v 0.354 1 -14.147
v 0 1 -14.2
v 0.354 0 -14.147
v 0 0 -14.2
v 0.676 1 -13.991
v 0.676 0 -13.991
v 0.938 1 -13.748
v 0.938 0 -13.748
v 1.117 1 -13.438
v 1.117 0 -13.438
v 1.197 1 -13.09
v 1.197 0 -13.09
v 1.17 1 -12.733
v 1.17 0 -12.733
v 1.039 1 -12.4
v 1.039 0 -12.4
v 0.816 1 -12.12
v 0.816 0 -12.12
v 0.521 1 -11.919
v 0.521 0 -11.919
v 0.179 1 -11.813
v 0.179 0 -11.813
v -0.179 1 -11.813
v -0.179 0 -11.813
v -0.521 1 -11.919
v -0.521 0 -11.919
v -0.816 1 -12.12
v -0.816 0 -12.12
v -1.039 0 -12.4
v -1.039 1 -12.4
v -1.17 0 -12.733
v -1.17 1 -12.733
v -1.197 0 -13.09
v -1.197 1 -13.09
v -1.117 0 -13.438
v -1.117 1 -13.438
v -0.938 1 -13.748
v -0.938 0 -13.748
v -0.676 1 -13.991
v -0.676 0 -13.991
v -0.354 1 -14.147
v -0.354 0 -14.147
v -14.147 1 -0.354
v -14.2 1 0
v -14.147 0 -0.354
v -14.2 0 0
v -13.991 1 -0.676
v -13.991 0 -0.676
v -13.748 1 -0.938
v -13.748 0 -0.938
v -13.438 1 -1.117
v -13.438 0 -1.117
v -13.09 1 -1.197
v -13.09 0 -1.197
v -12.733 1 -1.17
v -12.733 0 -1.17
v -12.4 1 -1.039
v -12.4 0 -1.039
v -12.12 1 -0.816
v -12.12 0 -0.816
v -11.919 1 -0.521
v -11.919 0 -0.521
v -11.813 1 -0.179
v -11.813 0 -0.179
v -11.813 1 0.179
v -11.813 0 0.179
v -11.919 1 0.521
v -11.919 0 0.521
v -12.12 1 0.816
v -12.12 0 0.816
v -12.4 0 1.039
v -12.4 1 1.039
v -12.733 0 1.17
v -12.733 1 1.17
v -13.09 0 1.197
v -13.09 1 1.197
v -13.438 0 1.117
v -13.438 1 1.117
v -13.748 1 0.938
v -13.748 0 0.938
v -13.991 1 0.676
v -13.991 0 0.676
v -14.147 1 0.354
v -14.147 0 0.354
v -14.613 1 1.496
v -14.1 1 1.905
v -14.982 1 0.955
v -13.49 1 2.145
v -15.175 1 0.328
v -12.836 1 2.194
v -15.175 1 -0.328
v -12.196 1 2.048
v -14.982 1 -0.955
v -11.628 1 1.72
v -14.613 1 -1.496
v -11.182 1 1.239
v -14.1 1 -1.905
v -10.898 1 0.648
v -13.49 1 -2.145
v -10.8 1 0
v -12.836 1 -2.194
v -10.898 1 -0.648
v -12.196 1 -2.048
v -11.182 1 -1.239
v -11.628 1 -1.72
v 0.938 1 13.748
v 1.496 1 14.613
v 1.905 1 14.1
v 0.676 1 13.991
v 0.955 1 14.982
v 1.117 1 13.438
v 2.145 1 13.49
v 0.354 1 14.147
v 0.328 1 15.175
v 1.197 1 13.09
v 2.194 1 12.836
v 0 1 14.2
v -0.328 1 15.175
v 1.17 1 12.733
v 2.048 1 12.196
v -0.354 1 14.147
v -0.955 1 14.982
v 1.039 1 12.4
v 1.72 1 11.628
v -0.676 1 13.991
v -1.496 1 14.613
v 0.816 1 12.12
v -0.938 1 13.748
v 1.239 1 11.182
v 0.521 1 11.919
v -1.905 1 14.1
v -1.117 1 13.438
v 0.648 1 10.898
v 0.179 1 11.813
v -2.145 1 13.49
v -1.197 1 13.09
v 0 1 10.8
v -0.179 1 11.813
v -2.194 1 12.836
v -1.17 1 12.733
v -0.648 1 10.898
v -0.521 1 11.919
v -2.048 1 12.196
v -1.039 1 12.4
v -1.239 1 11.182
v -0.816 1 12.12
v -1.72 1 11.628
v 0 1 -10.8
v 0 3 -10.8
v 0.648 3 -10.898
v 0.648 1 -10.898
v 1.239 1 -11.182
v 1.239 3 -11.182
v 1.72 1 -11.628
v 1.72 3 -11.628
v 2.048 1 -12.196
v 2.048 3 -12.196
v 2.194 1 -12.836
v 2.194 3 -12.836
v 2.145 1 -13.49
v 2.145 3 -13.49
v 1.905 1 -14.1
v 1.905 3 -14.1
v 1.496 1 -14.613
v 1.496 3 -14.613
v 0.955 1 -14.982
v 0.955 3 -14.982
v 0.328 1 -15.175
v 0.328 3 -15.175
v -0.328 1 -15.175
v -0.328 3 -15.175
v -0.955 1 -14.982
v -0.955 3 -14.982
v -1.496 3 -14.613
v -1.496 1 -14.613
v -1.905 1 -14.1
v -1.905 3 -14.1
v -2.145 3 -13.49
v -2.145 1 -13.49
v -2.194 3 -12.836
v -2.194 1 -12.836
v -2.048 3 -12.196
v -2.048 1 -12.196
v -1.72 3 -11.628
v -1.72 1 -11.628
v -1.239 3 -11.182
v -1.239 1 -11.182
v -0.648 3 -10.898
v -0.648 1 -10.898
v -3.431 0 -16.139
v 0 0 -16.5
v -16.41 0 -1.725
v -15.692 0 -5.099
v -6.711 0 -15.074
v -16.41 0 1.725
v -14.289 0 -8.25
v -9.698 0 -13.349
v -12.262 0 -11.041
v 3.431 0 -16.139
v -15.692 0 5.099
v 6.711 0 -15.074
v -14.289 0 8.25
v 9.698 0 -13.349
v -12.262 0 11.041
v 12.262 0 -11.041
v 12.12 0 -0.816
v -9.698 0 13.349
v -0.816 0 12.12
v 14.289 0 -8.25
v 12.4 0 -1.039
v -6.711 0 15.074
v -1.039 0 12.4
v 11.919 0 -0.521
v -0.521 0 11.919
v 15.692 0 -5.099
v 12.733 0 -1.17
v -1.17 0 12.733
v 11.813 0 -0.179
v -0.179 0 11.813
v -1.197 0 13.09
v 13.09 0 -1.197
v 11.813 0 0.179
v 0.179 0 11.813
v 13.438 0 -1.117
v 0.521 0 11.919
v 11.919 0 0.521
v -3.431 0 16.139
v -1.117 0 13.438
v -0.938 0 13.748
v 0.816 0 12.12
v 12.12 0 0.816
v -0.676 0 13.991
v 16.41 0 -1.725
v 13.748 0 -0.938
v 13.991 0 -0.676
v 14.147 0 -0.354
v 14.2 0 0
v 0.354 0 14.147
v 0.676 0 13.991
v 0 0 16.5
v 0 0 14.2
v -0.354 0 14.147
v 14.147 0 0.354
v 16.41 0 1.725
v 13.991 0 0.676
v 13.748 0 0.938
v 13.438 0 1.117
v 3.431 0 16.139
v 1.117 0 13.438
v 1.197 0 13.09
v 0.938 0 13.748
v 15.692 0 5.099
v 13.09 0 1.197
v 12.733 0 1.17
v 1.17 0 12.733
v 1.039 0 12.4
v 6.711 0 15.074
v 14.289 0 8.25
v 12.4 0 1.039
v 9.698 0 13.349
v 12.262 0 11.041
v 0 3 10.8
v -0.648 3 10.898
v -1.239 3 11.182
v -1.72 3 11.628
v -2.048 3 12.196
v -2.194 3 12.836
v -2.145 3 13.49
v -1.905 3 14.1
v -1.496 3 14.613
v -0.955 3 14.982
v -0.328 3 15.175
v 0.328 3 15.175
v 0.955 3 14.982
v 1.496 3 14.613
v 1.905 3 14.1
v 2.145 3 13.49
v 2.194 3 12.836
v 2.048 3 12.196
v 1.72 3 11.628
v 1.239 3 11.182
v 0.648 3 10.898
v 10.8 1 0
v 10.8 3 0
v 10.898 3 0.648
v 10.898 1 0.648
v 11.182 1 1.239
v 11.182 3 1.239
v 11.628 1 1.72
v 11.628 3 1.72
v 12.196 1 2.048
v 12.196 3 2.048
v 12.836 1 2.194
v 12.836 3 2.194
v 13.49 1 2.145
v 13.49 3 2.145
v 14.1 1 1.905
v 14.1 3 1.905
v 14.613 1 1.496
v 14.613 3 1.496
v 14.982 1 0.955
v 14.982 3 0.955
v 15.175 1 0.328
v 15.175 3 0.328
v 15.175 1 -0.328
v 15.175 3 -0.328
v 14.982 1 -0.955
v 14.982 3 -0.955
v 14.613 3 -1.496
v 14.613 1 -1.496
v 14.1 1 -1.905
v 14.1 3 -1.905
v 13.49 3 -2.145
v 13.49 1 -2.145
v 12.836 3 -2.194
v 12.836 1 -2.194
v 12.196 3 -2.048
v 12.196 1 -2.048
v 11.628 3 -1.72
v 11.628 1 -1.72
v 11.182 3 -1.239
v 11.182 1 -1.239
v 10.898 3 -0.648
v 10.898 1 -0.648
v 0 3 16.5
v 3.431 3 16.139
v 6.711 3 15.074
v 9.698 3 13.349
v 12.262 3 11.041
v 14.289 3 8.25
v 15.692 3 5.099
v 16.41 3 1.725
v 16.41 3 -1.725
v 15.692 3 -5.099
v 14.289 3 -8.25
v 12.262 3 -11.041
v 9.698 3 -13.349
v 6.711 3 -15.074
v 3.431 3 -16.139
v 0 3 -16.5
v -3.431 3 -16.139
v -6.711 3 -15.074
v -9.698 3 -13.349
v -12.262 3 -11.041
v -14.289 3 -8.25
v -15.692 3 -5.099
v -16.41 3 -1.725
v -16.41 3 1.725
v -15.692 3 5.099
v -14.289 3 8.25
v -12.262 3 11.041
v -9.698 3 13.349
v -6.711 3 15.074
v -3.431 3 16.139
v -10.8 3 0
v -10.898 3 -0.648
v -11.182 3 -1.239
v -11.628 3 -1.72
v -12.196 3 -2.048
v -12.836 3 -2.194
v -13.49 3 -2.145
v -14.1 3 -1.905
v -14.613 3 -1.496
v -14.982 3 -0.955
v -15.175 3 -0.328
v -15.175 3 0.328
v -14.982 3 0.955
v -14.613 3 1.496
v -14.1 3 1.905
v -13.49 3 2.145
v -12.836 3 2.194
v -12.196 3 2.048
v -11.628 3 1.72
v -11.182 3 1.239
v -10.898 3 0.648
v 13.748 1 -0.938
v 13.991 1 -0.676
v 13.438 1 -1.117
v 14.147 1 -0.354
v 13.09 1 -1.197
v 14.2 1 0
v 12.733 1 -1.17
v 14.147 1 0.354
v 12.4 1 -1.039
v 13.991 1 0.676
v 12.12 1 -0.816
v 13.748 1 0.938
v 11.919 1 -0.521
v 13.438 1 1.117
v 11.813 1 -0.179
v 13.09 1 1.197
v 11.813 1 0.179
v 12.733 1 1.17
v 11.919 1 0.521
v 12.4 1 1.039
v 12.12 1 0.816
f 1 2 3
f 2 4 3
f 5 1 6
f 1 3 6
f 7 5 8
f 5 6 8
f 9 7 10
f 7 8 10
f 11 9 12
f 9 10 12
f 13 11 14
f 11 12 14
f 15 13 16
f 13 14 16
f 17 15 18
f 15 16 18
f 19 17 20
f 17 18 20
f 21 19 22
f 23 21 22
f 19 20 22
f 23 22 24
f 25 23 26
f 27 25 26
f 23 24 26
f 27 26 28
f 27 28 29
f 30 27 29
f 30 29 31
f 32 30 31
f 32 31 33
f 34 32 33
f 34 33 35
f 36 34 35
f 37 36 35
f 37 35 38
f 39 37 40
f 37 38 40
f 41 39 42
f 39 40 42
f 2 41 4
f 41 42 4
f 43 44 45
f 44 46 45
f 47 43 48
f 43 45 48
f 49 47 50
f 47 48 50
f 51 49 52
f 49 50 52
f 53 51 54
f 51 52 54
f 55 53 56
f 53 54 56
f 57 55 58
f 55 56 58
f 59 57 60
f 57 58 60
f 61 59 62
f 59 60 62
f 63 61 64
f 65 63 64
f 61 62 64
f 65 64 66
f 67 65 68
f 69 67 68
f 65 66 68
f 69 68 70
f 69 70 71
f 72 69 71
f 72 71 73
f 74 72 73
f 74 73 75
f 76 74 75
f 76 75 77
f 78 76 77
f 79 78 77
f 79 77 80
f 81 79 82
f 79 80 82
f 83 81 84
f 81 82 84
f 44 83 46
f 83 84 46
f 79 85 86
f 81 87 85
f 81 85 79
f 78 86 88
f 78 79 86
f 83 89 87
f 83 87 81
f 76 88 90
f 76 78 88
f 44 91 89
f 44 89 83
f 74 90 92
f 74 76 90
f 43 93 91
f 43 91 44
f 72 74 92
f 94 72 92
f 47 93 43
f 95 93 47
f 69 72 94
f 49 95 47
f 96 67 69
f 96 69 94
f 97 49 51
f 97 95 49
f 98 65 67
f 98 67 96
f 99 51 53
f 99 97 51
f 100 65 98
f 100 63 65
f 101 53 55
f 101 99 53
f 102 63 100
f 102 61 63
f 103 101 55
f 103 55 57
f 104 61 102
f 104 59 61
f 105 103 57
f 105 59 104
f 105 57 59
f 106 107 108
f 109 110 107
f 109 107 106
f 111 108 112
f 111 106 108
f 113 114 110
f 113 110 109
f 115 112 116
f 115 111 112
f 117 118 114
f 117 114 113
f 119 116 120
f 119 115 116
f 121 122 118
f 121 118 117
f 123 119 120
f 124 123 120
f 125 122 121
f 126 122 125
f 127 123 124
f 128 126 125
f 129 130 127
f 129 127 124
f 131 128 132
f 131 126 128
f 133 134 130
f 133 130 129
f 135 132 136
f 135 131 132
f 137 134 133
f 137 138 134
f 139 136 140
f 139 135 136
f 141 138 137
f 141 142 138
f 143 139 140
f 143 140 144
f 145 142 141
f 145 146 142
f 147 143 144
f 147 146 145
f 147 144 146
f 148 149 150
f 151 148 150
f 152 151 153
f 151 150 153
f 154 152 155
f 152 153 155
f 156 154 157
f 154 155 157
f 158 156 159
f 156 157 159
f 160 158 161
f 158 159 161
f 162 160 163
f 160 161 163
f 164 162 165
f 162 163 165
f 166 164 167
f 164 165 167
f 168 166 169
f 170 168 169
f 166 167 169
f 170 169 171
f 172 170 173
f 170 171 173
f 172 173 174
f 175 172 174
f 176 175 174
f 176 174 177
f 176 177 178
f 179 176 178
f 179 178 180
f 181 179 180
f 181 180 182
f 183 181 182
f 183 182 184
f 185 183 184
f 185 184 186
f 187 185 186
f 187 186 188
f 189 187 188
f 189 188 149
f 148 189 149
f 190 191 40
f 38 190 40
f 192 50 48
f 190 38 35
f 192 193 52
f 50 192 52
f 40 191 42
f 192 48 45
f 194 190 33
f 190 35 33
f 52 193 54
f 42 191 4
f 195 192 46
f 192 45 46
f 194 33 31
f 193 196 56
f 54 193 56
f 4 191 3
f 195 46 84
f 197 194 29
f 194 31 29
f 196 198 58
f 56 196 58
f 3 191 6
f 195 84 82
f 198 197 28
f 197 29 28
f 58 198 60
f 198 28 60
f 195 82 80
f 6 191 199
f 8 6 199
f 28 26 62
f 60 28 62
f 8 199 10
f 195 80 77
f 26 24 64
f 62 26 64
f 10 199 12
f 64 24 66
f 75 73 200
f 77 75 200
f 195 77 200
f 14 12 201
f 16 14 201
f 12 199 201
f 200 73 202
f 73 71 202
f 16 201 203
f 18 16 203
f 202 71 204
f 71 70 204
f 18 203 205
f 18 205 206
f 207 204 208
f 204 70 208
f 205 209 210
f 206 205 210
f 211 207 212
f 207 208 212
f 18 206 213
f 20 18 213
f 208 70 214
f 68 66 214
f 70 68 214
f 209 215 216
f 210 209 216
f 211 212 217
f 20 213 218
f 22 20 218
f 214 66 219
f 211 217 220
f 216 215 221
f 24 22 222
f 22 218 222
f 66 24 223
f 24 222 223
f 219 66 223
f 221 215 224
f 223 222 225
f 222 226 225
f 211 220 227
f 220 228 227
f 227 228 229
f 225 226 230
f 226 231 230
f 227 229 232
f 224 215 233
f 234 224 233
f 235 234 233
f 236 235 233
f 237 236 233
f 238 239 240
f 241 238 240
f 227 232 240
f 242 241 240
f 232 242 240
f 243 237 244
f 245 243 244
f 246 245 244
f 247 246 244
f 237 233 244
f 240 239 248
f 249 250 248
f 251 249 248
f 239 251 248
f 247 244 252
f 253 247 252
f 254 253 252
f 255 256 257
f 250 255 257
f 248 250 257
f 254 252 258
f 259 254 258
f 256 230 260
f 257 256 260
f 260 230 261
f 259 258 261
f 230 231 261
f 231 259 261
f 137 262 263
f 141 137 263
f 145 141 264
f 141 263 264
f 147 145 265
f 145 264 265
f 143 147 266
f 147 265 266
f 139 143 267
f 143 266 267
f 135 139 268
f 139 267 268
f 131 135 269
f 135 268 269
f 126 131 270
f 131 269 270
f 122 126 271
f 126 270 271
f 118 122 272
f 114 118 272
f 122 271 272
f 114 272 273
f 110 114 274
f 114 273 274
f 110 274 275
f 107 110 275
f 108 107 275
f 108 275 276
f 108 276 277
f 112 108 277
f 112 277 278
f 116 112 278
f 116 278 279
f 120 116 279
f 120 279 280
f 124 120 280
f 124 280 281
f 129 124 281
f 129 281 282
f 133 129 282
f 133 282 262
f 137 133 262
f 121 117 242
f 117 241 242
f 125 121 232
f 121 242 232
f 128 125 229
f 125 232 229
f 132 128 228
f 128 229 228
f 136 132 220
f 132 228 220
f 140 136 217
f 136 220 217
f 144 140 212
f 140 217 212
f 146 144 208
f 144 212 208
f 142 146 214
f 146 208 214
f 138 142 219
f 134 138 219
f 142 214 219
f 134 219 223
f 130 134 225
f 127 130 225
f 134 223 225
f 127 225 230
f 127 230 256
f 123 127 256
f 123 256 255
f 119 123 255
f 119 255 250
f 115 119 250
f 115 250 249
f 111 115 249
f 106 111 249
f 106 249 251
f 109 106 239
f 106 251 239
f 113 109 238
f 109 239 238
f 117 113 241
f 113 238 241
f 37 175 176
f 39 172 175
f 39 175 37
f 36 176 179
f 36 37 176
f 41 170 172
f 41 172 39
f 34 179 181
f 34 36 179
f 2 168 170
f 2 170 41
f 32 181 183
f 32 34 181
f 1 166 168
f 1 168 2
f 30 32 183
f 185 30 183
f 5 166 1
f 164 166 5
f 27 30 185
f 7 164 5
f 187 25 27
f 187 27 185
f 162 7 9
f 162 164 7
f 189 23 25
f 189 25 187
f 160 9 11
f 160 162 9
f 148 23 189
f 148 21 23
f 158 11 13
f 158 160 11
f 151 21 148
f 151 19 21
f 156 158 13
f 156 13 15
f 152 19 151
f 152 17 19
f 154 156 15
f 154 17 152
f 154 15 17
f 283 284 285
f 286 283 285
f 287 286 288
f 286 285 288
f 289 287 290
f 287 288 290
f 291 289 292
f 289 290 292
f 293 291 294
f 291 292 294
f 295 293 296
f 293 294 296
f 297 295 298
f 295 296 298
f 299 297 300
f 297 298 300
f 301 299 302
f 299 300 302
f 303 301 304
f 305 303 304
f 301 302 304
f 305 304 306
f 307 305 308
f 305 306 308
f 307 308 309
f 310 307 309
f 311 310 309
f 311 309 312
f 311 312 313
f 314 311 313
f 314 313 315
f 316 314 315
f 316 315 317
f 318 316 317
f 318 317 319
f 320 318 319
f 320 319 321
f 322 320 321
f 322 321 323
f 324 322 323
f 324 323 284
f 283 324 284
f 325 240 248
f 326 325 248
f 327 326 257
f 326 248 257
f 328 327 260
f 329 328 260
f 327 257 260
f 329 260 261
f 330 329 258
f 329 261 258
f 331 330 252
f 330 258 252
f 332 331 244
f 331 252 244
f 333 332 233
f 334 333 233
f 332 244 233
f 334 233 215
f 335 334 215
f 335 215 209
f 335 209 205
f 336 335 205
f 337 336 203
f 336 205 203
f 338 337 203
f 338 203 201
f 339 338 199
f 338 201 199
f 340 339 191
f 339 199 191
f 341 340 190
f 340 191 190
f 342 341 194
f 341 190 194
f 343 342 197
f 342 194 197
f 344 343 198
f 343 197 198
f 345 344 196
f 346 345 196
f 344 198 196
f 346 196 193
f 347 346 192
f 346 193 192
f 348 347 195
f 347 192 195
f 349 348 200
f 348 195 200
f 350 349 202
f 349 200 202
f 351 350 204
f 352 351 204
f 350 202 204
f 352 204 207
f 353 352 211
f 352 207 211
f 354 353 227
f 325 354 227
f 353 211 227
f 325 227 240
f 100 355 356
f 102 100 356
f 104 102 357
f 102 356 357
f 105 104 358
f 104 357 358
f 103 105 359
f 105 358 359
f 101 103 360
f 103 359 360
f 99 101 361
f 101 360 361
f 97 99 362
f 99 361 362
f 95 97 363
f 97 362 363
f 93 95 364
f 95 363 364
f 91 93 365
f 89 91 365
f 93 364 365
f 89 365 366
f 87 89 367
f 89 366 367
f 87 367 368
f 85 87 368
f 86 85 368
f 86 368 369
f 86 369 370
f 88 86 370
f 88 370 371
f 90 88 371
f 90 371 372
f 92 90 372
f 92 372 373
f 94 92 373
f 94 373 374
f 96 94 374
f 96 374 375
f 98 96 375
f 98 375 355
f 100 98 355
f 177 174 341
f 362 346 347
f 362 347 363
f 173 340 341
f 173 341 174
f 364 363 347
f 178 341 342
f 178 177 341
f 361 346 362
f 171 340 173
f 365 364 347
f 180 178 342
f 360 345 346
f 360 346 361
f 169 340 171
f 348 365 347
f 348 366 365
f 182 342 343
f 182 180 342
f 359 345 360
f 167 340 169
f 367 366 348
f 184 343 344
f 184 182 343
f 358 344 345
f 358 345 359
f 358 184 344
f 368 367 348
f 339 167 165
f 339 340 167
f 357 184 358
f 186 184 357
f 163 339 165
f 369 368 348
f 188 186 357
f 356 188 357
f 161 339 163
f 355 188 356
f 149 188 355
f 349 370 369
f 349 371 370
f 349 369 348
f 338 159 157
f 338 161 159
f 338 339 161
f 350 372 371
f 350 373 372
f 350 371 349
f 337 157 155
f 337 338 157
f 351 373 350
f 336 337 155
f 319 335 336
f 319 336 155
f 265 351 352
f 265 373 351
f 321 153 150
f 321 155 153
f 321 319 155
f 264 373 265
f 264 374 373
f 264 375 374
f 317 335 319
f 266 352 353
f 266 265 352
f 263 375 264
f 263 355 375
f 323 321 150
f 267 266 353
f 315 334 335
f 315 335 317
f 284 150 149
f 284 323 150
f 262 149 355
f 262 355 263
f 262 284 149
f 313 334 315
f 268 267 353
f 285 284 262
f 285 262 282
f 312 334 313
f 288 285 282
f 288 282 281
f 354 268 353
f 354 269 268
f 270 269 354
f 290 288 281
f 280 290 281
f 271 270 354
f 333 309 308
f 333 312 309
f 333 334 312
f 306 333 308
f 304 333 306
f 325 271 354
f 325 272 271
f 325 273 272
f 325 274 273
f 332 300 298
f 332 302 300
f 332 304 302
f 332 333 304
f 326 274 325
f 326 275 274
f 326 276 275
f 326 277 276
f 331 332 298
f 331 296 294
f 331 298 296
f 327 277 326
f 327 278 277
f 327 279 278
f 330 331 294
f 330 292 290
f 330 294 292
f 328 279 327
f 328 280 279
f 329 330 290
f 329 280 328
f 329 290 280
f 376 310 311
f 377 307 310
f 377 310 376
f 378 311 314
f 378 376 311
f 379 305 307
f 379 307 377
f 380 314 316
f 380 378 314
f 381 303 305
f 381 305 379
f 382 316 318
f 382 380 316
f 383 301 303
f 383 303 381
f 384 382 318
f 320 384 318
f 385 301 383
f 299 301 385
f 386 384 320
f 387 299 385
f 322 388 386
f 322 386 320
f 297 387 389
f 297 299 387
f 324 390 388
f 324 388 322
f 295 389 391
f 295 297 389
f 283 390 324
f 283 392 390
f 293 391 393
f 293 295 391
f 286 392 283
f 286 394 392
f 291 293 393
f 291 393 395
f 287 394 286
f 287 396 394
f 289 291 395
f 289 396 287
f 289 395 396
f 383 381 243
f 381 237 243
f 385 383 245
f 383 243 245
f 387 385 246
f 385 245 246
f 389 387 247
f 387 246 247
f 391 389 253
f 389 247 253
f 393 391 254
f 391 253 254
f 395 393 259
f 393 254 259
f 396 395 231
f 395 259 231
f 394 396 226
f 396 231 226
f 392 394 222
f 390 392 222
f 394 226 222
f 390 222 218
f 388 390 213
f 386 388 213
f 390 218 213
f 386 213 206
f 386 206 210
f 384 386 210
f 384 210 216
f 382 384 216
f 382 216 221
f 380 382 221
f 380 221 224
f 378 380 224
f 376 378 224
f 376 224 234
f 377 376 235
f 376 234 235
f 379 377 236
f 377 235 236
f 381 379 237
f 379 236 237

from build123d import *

# Parameters (mm, degrees)
SKETCH1_R                      = 16.5
BOSS_EXTRUDE1_DEPTH            = 3
CBORE_FOR_M2_SHCS1_D           = 2.4
CBORE_FOR_M2_SHCS1_CBORE_D     = 4.4
CBORE_FOR_M2_SHCS1_CBORE_DEPTH = 2
CIRPATTERN1_COUNT              = 4


with BuildPart() as part:
    # Sketch1 → Boss-Extrude1 (new body)
    with BuildSketch(Plane(origin=(0, 0, 0), x_dir=(1, 0, 0), z_dir=(0, 1, 0))):
        with Locations(Location((0, 0, 0), (0, 0, 270))):
            Circle(SKETCH1_R)
    extrude(amount=BOSS_EXTRUDE1_DEPTH)

    # CBORE for M2 SHCS1 (through all)
    with Locations(Plane(origin=(0, 3, 0), x_dir=(1, 0, 0), z_dir=(0, 1, 0))):
        with Locations((-13, 0)):
            cbore_for_m2_shcs1 = CounterBoreHole(CBORE_FOR_M2_SHCS1_D / 2, CBORE_FOR_M2_SHCS1_CBORE_D / 2, CBORE_FOR_M2_SHCS1_CBORE_DEPTH)

    # CirPattern1: CBORE for M2 SHCS1 ×4 about axis
    cirpattern1_axis = Axis((0, 0, 0), (0, 1, 0))
    for i in range(1, CIRPATTERN1_COUNT):
        add(cbore_for_m2_shcs1.rotate(cirpattern1_axis, i * 360 / CIRPATTERN1_COUNT), mode=Mode.SUBTRACT)


solid = part.part
